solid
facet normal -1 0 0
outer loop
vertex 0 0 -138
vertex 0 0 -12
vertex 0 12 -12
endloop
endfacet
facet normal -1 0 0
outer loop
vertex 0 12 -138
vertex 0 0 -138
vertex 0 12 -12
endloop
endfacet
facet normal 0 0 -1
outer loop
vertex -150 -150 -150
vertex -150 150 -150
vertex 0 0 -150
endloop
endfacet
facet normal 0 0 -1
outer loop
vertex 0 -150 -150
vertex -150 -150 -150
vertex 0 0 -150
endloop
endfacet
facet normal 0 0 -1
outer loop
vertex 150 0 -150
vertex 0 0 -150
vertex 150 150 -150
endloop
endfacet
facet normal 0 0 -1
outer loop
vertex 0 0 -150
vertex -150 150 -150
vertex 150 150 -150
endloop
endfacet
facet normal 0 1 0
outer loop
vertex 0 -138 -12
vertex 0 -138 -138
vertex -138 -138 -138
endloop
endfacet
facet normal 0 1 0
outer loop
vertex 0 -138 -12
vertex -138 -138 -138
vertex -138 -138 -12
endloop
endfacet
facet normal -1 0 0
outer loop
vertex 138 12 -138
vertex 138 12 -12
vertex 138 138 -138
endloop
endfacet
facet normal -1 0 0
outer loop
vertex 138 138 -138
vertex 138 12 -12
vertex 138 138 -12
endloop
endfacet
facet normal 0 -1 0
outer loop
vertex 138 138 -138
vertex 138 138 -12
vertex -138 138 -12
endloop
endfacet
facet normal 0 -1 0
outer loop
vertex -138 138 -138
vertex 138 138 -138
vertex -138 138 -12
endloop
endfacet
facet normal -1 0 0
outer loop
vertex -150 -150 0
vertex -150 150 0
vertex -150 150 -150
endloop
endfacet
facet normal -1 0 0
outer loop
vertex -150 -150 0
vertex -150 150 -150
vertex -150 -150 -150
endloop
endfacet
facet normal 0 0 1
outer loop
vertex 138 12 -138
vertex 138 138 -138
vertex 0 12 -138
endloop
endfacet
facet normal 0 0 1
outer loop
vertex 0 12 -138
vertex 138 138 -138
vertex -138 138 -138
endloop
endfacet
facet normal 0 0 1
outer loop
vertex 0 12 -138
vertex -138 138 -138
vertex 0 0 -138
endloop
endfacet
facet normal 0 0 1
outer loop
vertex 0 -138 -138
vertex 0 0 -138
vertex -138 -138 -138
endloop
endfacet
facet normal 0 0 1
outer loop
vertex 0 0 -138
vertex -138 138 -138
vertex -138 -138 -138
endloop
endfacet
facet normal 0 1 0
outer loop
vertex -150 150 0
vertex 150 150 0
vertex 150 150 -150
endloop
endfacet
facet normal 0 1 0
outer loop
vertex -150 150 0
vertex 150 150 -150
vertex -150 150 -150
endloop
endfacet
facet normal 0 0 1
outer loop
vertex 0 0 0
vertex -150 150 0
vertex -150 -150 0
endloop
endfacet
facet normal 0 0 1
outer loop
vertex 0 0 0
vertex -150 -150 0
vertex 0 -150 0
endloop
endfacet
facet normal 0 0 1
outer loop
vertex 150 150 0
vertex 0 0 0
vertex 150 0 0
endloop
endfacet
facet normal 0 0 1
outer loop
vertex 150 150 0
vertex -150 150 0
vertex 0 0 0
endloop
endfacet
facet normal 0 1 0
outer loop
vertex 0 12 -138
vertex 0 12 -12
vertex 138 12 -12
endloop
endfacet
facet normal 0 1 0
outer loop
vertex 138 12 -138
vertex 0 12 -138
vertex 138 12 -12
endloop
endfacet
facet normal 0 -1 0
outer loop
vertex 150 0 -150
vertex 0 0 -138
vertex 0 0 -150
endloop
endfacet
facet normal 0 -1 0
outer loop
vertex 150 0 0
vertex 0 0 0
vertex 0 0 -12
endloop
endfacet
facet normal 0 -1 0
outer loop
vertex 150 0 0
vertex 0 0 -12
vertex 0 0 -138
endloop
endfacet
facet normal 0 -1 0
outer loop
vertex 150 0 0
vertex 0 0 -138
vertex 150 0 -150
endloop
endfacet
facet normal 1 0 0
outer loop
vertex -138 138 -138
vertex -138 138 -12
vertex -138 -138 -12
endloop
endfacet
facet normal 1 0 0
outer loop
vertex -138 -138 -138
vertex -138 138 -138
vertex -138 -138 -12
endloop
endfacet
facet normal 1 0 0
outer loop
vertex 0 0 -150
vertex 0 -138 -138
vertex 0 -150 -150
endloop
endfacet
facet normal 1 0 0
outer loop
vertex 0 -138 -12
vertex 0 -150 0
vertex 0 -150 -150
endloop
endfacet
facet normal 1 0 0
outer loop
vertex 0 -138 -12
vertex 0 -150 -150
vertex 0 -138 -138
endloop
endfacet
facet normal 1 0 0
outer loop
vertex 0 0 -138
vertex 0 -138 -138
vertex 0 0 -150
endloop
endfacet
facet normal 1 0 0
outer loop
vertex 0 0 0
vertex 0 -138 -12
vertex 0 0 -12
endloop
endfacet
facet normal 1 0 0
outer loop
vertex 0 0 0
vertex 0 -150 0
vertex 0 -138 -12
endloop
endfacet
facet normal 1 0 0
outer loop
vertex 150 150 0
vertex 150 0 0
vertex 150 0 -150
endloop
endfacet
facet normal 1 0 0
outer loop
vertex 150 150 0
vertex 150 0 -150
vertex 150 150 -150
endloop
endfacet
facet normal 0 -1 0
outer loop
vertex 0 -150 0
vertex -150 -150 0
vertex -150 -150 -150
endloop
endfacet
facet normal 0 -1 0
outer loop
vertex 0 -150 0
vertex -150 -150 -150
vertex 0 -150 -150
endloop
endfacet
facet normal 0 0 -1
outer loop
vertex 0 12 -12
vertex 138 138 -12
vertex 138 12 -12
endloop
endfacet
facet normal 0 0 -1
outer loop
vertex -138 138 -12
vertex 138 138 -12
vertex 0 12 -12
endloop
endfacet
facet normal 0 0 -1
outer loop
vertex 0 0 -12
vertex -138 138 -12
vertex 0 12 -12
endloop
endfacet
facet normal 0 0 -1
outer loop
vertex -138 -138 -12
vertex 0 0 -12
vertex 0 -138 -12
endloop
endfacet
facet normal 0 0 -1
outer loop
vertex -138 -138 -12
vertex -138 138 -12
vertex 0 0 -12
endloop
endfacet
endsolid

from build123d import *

# Parameters (mm, degrees)
F1_DEPTH = 150
F2_T     = -12


# Not quite as in the source:
# - a shell that OpenCascade refuses in one call is made with other operations: the cavity is built on its own and cut out


with BuildPart() as f1:
    # F0 (on Top) → F1 (new body)
    with BuildSketch(Plane.XY):
        Polygon((150, 150), (-150, 150), (-150, -150), (0, -150), (0, 0), (150, 0), align=None)
    extrude(amount=-F1_DEPTH)

    # F2: a shell. OpenCascade refuses it in one call, so the cavity is built on its own and cut out:
    # the body offset inwards by the wall thickness, plus a prism from it out through each open face.
    f2_core = offset(f1.part, amount=F2_T, kind=Kind.INTERSECTION, mode=Mode.PRIVATE)
    f2_exits = [f2_core.faces().sort_by_distance(p)[0] for p in [
        (-12, -63, -75),
    ]]
    add(f2_core, mode=Mode.SUBTRACT)
    extrude(f2_exits, amount=-F2_T, mode=Mode.SUBTRACT)


solid = f1.part
